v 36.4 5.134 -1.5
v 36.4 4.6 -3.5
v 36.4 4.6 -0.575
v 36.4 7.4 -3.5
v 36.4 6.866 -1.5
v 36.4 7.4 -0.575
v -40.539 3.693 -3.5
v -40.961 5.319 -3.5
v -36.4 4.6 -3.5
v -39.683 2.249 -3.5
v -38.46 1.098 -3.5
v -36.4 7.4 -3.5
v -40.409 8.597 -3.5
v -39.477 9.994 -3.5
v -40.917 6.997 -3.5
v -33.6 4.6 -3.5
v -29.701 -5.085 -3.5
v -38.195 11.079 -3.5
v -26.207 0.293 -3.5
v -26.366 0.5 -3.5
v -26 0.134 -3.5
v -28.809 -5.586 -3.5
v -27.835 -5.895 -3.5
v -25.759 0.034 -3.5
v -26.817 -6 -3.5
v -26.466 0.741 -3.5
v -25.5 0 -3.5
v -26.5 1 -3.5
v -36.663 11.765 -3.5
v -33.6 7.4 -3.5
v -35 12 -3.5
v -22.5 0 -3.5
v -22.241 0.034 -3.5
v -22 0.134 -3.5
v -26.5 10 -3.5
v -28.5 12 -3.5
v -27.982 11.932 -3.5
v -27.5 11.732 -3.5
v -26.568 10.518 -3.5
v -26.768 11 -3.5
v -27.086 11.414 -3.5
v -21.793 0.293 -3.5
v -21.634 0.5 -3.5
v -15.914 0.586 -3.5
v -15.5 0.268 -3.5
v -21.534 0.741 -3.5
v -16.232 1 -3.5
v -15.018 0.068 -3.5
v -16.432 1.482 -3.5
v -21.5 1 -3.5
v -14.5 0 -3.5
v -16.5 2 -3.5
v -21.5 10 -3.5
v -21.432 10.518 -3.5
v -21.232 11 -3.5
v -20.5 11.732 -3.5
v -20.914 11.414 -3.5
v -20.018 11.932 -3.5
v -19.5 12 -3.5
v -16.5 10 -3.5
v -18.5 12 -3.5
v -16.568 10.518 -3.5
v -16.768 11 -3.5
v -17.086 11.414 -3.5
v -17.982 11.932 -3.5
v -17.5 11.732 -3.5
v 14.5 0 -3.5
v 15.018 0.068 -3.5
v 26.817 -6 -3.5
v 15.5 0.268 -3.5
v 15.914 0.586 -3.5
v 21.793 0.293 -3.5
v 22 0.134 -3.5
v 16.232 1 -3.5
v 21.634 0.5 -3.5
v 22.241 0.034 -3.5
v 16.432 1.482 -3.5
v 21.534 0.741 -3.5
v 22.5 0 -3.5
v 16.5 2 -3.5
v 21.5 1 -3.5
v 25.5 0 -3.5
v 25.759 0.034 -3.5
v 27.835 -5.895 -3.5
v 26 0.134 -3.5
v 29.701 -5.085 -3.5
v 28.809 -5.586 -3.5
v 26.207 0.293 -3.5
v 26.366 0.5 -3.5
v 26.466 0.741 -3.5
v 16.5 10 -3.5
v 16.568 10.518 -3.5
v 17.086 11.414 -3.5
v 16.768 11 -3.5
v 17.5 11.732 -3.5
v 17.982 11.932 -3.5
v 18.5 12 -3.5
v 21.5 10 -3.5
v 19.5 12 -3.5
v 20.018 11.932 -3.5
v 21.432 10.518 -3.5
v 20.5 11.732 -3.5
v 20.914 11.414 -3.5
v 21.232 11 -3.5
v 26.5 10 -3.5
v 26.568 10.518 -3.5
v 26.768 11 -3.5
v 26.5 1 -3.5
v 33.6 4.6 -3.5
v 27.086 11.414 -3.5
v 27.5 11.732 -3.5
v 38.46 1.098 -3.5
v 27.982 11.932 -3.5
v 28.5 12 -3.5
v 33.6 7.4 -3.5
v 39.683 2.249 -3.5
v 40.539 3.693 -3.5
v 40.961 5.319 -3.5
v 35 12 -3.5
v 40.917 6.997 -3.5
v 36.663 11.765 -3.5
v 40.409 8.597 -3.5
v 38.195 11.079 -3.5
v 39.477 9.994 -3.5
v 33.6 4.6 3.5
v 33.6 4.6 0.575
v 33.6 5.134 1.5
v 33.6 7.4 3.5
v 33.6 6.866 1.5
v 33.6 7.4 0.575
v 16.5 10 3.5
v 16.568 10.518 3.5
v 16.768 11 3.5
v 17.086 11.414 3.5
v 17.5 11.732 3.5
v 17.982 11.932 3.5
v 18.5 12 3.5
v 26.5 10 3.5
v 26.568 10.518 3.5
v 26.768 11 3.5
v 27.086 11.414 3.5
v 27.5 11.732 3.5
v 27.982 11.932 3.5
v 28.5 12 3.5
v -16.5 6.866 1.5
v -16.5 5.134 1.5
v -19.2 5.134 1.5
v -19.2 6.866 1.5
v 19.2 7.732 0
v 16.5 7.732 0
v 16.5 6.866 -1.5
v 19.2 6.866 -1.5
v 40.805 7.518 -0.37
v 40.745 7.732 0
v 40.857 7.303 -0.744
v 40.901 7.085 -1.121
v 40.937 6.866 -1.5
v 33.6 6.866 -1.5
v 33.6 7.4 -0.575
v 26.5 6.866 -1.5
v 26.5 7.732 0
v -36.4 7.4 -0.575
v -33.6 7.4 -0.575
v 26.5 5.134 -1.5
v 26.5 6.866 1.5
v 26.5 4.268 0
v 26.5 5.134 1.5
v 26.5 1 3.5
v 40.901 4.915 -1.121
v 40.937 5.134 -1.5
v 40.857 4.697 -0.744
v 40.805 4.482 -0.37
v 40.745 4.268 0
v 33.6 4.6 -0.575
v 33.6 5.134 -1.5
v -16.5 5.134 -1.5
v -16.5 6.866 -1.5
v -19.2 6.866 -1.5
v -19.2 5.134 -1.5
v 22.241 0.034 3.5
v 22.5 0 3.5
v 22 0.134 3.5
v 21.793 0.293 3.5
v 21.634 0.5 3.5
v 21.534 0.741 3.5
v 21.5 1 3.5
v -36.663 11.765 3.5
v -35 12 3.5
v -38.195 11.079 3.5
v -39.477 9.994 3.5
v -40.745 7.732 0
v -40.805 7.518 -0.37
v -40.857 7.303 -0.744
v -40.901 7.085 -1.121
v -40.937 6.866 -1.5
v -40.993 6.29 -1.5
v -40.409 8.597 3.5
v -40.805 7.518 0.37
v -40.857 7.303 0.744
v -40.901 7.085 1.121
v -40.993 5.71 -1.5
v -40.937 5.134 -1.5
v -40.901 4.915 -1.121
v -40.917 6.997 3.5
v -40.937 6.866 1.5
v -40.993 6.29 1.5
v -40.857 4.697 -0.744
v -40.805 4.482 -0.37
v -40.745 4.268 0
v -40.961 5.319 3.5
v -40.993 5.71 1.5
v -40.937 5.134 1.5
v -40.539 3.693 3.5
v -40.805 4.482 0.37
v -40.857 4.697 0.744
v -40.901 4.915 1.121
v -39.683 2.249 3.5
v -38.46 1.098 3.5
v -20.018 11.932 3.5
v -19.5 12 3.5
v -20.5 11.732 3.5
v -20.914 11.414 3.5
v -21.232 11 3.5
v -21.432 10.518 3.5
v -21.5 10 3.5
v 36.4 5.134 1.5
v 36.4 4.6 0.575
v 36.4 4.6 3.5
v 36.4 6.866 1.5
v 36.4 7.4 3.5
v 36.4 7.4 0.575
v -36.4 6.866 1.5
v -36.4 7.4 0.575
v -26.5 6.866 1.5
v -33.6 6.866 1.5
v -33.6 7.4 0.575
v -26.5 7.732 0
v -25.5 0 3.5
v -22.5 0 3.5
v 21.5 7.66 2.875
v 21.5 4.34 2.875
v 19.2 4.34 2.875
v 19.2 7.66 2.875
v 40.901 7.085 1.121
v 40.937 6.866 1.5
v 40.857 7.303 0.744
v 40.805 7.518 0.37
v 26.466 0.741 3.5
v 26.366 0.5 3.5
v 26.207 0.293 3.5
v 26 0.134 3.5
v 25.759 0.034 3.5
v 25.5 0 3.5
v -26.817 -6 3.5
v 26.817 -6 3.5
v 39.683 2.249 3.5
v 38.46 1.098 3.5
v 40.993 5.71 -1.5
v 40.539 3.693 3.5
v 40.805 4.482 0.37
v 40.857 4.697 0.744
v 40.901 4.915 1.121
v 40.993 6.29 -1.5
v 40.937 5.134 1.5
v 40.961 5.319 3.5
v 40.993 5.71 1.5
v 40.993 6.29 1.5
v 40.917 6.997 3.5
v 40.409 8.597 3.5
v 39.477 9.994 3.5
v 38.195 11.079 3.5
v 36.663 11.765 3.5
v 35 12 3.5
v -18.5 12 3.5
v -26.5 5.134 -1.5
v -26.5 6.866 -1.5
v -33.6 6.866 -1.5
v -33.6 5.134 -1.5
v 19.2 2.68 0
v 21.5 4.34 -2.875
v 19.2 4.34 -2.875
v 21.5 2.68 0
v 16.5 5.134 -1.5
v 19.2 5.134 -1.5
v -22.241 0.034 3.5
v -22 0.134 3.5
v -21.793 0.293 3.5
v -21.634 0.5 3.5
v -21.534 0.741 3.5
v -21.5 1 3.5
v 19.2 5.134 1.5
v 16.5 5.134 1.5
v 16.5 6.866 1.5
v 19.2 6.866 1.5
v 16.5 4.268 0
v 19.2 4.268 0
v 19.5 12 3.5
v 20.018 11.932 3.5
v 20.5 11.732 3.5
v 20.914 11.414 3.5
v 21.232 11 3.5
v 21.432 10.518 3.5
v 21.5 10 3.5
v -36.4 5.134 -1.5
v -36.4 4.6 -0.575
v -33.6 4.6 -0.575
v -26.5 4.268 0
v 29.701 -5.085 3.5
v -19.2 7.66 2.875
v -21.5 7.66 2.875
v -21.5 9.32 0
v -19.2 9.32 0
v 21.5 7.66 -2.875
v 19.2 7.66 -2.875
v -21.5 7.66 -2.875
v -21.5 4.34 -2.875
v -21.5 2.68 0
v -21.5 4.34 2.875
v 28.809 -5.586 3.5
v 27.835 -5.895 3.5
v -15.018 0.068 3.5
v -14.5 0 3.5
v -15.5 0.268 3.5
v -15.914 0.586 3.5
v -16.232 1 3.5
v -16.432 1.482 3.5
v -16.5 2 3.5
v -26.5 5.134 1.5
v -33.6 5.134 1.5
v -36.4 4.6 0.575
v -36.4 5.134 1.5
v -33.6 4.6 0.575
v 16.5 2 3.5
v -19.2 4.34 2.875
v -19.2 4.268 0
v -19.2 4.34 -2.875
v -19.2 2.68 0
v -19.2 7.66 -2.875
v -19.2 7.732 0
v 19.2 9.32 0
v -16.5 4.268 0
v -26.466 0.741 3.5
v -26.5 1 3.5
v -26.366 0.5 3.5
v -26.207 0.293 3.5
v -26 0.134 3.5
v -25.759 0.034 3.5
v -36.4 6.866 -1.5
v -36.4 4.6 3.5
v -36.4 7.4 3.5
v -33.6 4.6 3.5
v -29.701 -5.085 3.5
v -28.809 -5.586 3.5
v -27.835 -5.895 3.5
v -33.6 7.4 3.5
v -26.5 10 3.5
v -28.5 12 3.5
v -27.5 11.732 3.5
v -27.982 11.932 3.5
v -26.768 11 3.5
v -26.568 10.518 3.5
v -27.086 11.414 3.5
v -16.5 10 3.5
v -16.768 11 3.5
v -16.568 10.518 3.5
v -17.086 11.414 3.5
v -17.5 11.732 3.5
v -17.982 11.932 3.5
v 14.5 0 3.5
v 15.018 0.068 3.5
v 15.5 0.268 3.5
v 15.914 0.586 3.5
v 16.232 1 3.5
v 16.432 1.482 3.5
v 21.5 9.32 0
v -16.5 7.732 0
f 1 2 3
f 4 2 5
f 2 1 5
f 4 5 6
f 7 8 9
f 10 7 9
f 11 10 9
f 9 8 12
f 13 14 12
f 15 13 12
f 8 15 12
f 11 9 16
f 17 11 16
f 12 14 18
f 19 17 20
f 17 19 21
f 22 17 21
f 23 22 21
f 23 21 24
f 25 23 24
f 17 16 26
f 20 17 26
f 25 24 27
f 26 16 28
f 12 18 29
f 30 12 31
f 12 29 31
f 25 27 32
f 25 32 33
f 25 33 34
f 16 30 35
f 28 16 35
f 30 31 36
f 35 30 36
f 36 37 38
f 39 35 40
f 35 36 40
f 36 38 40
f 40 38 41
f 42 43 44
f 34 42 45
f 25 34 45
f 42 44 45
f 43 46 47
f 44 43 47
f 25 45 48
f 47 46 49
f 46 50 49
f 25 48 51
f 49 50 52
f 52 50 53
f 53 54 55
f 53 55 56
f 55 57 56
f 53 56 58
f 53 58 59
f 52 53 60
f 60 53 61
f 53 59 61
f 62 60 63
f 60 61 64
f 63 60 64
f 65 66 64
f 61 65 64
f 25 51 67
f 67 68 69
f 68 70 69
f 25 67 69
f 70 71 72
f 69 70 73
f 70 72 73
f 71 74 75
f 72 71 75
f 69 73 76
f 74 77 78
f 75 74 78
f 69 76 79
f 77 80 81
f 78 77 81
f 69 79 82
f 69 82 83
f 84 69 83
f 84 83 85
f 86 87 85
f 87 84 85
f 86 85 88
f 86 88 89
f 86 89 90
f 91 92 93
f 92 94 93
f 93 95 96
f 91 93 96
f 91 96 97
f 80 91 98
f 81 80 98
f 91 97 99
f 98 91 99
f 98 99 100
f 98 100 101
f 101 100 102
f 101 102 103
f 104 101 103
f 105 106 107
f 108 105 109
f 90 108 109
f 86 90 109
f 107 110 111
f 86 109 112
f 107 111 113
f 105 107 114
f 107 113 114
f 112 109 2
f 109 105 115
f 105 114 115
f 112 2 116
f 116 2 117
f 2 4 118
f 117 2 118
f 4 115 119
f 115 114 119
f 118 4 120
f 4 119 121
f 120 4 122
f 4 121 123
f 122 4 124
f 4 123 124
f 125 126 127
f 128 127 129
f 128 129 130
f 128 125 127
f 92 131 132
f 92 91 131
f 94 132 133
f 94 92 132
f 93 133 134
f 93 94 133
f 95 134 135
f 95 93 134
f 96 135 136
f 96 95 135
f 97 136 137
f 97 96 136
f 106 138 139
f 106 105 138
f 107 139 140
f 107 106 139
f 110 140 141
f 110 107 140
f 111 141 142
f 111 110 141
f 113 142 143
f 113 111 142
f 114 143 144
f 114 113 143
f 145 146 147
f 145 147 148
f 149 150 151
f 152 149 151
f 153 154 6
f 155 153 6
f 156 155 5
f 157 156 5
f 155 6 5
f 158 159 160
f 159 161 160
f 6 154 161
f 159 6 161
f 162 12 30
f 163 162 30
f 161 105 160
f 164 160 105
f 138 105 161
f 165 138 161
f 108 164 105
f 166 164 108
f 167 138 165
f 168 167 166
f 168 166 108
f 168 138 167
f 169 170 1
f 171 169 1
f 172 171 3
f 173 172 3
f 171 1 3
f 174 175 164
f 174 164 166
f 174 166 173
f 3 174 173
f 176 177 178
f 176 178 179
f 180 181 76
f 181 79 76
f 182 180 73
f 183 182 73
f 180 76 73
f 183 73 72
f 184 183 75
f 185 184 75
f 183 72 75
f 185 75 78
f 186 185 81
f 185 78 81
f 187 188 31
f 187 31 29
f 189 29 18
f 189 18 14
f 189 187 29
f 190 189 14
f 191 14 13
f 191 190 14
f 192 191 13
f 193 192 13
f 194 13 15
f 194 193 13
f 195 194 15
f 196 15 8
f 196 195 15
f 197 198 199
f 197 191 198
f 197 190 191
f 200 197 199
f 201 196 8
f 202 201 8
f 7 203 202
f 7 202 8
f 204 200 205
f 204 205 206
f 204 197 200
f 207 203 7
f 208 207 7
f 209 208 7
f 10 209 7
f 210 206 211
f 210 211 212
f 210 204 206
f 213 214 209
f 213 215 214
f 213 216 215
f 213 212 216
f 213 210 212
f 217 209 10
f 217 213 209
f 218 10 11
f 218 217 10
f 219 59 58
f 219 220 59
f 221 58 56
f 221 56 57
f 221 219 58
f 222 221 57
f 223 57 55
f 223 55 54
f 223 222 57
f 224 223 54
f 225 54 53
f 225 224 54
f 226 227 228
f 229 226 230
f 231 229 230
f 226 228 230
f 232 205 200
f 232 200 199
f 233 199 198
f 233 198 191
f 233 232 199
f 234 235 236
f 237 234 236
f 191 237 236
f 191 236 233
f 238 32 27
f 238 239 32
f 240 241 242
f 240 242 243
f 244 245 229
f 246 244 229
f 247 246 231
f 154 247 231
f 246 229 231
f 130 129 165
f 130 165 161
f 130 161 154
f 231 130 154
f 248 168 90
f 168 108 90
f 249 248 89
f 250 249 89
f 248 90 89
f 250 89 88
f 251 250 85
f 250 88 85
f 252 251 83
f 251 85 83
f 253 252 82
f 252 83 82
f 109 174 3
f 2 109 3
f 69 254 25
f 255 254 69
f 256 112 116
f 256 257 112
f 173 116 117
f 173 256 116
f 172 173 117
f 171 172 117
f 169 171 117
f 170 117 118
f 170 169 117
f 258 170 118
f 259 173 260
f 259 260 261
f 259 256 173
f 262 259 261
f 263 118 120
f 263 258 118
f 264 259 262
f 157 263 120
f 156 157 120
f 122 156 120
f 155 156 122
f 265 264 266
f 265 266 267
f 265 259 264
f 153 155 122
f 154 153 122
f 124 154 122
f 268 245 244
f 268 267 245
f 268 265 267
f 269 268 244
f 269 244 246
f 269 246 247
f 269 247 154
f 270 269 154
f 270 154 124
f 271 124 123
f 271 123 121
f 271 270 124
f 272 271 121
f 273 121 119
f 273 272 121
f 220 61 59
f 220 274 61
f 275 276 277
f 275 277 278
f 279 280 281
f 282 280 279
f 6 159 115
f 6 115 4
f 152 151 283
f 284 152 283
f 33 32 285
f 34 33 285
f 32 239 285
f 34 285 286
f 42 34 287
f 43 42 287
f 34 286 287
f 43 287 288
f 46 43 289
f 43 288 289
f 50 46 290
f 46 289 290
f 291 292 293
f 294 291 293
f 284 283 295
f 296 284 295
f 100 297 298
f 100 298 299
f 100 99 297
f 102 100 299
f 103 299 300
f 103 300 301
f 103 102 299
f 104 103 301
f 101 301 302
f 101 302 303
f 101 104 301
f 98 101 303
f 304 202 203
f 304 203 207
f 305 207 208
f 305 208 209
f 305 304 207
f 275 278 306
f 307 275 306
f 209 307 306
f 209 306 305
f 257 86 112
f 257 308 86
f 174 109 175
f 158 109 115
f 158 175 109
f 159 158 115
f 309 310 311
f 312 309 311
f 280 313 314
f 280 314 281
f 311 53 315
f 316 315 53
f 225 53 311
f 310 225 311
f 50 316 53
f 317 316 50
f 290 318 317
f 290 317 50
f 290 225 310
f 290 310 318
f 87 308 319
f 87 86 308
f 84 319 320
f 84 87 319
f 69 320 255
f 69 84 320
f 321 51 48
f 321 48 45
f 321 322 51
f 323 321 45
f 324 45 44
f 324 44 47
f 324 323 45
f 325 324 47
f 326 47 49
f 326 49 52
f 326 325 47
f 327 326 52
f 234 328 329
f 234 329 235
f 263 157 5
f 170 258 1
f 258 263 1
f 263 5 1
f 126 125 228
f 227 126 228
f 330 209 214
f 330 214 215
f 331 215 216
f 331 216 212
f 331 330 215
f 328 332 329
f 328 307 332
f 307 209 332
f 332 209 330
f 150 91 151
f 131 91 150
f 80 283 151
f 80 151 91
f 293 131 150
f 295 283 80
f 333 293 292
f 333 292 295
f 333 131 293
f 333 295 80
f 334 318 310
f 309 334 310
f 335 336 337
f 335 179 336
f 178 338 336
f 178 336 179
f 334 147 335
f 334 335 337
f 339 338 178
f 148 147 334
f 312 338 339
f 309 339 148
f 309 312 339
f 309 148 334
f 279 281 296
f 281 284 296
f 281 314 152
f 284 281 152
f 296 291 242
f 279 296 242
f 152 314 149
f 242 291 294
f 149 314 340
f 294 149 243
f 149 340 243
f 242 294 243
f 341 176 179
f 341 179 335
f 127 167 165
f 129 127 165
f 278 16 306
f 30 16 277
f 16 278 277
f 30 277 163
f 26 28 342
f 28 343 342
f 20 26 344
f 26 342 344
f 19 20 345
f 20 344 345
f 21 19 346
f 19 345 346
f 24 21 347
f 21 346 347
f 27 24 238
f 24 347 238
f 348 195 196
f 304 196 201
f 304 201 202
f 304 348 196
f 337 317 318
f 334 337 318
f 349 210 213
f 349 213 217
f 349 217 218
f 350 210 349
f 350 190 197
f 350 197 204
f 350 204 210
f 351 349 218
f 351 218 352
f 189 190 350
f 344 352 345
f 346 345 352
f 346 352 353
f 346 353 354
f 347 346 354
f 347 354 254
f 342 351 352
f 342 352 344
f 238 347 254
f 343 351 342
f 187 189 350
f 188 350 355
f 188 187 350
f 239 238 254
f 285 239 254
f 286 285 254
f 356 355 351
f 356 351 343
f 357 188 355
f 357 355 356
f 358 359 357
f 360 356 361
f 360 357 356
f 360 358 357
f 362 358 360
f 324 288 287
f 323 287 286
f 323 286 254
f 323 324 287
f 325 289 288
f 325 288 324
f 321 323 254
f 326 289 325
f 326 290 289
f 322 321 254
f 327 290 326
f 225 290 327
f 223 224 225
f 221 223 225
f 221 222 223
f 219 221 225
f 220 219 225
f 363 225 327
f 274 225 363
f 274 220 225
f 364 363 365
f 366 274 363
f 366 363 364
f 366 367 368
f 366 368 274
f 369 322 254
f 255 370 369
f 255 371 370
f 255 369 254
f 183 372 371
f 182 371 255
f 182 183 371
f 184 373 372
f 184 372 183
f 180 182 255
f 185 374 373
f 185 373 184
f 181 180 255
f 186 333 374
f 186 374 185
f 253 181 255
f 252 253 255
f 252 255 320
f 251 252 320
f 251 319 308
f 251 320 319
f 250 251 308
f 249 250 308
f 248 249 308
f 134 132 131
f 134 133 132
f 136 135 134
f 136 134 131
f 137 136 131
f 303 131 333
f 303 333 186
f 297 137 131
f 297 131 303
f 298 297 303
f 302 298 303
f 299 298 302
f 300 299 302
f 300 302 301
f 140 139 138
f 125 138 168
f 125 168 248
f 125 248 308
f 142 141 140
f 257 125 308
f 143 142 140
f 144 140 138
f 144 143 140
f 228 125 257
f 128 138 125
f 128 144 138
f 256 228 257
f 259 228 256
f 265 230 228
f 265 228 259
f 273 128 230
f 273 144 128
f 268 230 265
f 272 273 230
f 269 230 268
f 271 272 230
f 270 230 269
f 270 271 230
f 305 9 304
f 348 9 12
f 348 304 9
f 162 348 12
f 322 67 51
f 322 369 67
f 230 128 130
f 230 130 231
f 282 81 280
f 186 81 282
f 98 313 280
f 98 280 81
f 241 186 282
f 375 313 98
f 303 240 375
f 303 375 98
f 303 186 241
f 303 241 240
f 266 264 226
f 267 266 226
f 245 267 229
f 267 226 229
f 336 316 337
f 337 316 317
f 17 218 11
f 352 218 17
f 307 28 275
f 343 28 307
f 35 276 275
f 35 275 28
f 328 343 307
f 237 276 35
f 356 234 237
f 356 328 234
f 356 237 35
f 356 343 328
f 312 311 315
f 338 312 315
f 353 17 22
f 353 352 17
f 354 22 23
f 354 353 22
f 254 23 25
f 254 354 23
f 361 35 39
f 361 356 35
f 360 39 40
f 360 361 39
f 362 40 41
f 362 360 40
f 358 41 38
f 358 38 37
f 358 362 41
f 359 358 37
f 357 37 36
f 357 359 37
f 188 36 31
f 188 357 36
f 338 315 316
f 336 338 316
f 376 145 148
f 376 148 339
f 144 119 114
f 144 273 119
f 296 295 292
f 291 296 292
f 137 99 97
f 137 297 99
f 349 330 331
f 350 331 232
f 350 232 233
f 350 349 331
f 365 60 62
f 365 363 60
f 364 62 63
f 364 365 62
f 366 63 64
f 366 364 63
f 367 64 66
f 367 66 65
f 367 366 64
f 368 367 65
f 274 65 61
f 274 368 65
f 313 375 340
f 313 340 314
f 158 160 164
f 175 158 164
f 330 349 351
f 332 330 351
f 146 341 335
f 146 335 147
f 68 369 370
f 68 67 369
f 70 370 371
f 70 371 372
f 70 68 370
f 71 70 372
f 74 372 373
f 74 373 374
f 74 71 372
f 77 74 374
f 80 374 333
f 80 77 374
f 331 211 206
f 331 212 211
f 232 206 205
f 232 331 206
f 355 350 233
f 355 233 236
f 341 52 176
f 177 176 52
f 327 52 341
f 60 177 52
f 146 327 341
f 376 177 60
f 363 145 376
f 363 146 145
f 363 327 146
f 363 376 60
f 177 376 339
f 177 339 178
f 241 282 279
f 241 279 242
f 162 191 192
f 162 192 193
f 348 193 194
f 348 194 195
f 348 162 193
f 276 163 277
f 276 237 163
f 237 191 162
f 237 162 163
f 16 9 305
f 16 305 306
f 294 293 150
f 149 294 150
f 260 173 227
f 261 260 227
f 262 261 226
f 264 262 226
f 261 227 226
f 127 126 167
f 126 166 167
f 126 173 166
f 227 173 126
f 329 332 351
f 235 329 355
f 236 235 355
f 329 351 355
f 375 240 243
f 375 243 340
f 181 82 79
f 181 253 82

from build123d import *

# Parameters (mm, degrees)
SKETCH1_W               = 2.8
SKETCH1_H               = 2.8
BOSS_EXTRUDE1_DEPTH     = 3.5
CUT_EXTRUDE1_DEPTH      = 42
CUT_EXTRUDE1_DEPTH_BACK = 42
CUT_EXTRUDE2_DEPTH      = 2.3
FILLET1_R               = 2
FILLET2_R               = 5
FILLET3_R               = 1


with BuildPart() as part:
    # Sketch1 → Boss-Extrude1 (new body, symmetric)
    with BuildSketch(Plane.XY):
        with BuildLine():
            Line((16.5, 0), (-16.5, 0))
            Line((-16.5, 0), (-16.5, 12))
            Line((-16.5, 12), (-21.5, 12))
            Line((-21.5, 12), (-21.5, 0))
            Line((-21.5, 0), (-26.5, 0))
            Line((-26.5, 0), (-26.5, 12))
            Line((-26.5, 12), (-35, 12))
            ThreePointArc((-35, 12), (-40.718865407, 7.81509737), (-38.460099186, 1.09819282))
            Line((-38.460099186, 1.09819282), (-28.404326023, -6))
            Line((-28.404326023, -6), (28.404326023, -6))
            Line((28.404326023, -6), (38.460099186, 1.09819282))
            ThreePointArc((38.460099186, 1.09819282), (40.718865407, 7.81509737), (35, 12))
            Line((35, 12), (26.5, 12))
            Line((26.5, 12), (26.5, 0))
            Line((26.5, 0), (21.5, 0))
            Line((21.5, 0), (21.5, 12))
            Line((21.5, 12), (16.5, 12))
            Line((16.5, 12), (16.5, 0))
        make_face()
        with Locations((35, 6)):
            Rectangle(SKETCH1_W, SKETCH1_H, mode=Mode.SUBTRACT)
        with Locations((-35, 6)):
            Rectangle(SKETCH1_W, SKETCH1_H, mode=Mode.SUBTRACT)
    extrude(amount=BOSS_EXTRUDE1_DEPTH, both=True)

    # Sketch2 → Cut-Extrude1 (cut, two sides)
    with BuildSketch(Plane.ZY) as cut_extrude1_sk:
        Polygon((0, 7.732050808), (-1.5, 6.866025404), (-1.5, 5.133974596), (0, 4.267949192), (1.5, 5.133974596), (1.5, 6.866025404), align=None)
    extrude(amount=CUT_EXTRUDE1_DEPTH, mode=Mode.SUBTRACT)
    extrude(cut_extrude1_sk.sketch, amount=-CUT_EXTRUDE1_DEPTH_BACK, mode=Mode.SUBTRACT)

    # Sketch3 → Cut-Extrude2 (cut)
    with BuildSketch(Plane.ZY.offset(21.5)):
        Polygon((2.875, 7.659882024), (0, 9.319764048), (-2.875, 7.659882024), (-2.875, 4.340117976), (0, 2.680235952), (2.875, 4.340117976), align=None)
    cut_extrude2 = extrude(amount=-CUT_EXTRUDE2_DEPTH, mode=Mode.SUBTRACT)

    # Mirror1: Cut-Extrude2 across plane
    add(cut_extrude2.mirror(Plane(origin=(0, 0, 0), x_dir=(0, 0, 1), z_dir=(1, 0, 0))), mode=Mode.SUBTRACT)

    # Fillet1
    fillet1_edges = [part.edges().sort_by_distance(p)[0] for p in [
        (-16.5, 12, 0),
        (-16.5, 0, 0),
        (16.5, 0, 0),
        (16.5, 12, 0),
        (21.5, 12, 0),
        (26.5, 12, 0),
        (-26.5, 12, 0),
        (-21.5, 12, 0),
    ]]
    fillet(fillet1_edges, radius=FILLET1_R)

    # Fillet2
    fillet2_edges = [part.edges().sort_by_distance(p)[0] for p in [
        (28.404326023, -6, 0),
        (-28.404326023, -6, 0),
    ]]
    fillet(fillet2_edges, radius=FILLET2_R)

    # Fillet3
    fillet3_edges = [part.edges().sort_by_distance(p)[0] for p in [
        (21.5, 0, 0),
        (26.5, 0, 0),
        (-26.5, 0, 0),
        (-21.5, 0, 0),
    ]]
    fillet(fillet3_edges, radius=FILLET3_R)


solid = part.part
